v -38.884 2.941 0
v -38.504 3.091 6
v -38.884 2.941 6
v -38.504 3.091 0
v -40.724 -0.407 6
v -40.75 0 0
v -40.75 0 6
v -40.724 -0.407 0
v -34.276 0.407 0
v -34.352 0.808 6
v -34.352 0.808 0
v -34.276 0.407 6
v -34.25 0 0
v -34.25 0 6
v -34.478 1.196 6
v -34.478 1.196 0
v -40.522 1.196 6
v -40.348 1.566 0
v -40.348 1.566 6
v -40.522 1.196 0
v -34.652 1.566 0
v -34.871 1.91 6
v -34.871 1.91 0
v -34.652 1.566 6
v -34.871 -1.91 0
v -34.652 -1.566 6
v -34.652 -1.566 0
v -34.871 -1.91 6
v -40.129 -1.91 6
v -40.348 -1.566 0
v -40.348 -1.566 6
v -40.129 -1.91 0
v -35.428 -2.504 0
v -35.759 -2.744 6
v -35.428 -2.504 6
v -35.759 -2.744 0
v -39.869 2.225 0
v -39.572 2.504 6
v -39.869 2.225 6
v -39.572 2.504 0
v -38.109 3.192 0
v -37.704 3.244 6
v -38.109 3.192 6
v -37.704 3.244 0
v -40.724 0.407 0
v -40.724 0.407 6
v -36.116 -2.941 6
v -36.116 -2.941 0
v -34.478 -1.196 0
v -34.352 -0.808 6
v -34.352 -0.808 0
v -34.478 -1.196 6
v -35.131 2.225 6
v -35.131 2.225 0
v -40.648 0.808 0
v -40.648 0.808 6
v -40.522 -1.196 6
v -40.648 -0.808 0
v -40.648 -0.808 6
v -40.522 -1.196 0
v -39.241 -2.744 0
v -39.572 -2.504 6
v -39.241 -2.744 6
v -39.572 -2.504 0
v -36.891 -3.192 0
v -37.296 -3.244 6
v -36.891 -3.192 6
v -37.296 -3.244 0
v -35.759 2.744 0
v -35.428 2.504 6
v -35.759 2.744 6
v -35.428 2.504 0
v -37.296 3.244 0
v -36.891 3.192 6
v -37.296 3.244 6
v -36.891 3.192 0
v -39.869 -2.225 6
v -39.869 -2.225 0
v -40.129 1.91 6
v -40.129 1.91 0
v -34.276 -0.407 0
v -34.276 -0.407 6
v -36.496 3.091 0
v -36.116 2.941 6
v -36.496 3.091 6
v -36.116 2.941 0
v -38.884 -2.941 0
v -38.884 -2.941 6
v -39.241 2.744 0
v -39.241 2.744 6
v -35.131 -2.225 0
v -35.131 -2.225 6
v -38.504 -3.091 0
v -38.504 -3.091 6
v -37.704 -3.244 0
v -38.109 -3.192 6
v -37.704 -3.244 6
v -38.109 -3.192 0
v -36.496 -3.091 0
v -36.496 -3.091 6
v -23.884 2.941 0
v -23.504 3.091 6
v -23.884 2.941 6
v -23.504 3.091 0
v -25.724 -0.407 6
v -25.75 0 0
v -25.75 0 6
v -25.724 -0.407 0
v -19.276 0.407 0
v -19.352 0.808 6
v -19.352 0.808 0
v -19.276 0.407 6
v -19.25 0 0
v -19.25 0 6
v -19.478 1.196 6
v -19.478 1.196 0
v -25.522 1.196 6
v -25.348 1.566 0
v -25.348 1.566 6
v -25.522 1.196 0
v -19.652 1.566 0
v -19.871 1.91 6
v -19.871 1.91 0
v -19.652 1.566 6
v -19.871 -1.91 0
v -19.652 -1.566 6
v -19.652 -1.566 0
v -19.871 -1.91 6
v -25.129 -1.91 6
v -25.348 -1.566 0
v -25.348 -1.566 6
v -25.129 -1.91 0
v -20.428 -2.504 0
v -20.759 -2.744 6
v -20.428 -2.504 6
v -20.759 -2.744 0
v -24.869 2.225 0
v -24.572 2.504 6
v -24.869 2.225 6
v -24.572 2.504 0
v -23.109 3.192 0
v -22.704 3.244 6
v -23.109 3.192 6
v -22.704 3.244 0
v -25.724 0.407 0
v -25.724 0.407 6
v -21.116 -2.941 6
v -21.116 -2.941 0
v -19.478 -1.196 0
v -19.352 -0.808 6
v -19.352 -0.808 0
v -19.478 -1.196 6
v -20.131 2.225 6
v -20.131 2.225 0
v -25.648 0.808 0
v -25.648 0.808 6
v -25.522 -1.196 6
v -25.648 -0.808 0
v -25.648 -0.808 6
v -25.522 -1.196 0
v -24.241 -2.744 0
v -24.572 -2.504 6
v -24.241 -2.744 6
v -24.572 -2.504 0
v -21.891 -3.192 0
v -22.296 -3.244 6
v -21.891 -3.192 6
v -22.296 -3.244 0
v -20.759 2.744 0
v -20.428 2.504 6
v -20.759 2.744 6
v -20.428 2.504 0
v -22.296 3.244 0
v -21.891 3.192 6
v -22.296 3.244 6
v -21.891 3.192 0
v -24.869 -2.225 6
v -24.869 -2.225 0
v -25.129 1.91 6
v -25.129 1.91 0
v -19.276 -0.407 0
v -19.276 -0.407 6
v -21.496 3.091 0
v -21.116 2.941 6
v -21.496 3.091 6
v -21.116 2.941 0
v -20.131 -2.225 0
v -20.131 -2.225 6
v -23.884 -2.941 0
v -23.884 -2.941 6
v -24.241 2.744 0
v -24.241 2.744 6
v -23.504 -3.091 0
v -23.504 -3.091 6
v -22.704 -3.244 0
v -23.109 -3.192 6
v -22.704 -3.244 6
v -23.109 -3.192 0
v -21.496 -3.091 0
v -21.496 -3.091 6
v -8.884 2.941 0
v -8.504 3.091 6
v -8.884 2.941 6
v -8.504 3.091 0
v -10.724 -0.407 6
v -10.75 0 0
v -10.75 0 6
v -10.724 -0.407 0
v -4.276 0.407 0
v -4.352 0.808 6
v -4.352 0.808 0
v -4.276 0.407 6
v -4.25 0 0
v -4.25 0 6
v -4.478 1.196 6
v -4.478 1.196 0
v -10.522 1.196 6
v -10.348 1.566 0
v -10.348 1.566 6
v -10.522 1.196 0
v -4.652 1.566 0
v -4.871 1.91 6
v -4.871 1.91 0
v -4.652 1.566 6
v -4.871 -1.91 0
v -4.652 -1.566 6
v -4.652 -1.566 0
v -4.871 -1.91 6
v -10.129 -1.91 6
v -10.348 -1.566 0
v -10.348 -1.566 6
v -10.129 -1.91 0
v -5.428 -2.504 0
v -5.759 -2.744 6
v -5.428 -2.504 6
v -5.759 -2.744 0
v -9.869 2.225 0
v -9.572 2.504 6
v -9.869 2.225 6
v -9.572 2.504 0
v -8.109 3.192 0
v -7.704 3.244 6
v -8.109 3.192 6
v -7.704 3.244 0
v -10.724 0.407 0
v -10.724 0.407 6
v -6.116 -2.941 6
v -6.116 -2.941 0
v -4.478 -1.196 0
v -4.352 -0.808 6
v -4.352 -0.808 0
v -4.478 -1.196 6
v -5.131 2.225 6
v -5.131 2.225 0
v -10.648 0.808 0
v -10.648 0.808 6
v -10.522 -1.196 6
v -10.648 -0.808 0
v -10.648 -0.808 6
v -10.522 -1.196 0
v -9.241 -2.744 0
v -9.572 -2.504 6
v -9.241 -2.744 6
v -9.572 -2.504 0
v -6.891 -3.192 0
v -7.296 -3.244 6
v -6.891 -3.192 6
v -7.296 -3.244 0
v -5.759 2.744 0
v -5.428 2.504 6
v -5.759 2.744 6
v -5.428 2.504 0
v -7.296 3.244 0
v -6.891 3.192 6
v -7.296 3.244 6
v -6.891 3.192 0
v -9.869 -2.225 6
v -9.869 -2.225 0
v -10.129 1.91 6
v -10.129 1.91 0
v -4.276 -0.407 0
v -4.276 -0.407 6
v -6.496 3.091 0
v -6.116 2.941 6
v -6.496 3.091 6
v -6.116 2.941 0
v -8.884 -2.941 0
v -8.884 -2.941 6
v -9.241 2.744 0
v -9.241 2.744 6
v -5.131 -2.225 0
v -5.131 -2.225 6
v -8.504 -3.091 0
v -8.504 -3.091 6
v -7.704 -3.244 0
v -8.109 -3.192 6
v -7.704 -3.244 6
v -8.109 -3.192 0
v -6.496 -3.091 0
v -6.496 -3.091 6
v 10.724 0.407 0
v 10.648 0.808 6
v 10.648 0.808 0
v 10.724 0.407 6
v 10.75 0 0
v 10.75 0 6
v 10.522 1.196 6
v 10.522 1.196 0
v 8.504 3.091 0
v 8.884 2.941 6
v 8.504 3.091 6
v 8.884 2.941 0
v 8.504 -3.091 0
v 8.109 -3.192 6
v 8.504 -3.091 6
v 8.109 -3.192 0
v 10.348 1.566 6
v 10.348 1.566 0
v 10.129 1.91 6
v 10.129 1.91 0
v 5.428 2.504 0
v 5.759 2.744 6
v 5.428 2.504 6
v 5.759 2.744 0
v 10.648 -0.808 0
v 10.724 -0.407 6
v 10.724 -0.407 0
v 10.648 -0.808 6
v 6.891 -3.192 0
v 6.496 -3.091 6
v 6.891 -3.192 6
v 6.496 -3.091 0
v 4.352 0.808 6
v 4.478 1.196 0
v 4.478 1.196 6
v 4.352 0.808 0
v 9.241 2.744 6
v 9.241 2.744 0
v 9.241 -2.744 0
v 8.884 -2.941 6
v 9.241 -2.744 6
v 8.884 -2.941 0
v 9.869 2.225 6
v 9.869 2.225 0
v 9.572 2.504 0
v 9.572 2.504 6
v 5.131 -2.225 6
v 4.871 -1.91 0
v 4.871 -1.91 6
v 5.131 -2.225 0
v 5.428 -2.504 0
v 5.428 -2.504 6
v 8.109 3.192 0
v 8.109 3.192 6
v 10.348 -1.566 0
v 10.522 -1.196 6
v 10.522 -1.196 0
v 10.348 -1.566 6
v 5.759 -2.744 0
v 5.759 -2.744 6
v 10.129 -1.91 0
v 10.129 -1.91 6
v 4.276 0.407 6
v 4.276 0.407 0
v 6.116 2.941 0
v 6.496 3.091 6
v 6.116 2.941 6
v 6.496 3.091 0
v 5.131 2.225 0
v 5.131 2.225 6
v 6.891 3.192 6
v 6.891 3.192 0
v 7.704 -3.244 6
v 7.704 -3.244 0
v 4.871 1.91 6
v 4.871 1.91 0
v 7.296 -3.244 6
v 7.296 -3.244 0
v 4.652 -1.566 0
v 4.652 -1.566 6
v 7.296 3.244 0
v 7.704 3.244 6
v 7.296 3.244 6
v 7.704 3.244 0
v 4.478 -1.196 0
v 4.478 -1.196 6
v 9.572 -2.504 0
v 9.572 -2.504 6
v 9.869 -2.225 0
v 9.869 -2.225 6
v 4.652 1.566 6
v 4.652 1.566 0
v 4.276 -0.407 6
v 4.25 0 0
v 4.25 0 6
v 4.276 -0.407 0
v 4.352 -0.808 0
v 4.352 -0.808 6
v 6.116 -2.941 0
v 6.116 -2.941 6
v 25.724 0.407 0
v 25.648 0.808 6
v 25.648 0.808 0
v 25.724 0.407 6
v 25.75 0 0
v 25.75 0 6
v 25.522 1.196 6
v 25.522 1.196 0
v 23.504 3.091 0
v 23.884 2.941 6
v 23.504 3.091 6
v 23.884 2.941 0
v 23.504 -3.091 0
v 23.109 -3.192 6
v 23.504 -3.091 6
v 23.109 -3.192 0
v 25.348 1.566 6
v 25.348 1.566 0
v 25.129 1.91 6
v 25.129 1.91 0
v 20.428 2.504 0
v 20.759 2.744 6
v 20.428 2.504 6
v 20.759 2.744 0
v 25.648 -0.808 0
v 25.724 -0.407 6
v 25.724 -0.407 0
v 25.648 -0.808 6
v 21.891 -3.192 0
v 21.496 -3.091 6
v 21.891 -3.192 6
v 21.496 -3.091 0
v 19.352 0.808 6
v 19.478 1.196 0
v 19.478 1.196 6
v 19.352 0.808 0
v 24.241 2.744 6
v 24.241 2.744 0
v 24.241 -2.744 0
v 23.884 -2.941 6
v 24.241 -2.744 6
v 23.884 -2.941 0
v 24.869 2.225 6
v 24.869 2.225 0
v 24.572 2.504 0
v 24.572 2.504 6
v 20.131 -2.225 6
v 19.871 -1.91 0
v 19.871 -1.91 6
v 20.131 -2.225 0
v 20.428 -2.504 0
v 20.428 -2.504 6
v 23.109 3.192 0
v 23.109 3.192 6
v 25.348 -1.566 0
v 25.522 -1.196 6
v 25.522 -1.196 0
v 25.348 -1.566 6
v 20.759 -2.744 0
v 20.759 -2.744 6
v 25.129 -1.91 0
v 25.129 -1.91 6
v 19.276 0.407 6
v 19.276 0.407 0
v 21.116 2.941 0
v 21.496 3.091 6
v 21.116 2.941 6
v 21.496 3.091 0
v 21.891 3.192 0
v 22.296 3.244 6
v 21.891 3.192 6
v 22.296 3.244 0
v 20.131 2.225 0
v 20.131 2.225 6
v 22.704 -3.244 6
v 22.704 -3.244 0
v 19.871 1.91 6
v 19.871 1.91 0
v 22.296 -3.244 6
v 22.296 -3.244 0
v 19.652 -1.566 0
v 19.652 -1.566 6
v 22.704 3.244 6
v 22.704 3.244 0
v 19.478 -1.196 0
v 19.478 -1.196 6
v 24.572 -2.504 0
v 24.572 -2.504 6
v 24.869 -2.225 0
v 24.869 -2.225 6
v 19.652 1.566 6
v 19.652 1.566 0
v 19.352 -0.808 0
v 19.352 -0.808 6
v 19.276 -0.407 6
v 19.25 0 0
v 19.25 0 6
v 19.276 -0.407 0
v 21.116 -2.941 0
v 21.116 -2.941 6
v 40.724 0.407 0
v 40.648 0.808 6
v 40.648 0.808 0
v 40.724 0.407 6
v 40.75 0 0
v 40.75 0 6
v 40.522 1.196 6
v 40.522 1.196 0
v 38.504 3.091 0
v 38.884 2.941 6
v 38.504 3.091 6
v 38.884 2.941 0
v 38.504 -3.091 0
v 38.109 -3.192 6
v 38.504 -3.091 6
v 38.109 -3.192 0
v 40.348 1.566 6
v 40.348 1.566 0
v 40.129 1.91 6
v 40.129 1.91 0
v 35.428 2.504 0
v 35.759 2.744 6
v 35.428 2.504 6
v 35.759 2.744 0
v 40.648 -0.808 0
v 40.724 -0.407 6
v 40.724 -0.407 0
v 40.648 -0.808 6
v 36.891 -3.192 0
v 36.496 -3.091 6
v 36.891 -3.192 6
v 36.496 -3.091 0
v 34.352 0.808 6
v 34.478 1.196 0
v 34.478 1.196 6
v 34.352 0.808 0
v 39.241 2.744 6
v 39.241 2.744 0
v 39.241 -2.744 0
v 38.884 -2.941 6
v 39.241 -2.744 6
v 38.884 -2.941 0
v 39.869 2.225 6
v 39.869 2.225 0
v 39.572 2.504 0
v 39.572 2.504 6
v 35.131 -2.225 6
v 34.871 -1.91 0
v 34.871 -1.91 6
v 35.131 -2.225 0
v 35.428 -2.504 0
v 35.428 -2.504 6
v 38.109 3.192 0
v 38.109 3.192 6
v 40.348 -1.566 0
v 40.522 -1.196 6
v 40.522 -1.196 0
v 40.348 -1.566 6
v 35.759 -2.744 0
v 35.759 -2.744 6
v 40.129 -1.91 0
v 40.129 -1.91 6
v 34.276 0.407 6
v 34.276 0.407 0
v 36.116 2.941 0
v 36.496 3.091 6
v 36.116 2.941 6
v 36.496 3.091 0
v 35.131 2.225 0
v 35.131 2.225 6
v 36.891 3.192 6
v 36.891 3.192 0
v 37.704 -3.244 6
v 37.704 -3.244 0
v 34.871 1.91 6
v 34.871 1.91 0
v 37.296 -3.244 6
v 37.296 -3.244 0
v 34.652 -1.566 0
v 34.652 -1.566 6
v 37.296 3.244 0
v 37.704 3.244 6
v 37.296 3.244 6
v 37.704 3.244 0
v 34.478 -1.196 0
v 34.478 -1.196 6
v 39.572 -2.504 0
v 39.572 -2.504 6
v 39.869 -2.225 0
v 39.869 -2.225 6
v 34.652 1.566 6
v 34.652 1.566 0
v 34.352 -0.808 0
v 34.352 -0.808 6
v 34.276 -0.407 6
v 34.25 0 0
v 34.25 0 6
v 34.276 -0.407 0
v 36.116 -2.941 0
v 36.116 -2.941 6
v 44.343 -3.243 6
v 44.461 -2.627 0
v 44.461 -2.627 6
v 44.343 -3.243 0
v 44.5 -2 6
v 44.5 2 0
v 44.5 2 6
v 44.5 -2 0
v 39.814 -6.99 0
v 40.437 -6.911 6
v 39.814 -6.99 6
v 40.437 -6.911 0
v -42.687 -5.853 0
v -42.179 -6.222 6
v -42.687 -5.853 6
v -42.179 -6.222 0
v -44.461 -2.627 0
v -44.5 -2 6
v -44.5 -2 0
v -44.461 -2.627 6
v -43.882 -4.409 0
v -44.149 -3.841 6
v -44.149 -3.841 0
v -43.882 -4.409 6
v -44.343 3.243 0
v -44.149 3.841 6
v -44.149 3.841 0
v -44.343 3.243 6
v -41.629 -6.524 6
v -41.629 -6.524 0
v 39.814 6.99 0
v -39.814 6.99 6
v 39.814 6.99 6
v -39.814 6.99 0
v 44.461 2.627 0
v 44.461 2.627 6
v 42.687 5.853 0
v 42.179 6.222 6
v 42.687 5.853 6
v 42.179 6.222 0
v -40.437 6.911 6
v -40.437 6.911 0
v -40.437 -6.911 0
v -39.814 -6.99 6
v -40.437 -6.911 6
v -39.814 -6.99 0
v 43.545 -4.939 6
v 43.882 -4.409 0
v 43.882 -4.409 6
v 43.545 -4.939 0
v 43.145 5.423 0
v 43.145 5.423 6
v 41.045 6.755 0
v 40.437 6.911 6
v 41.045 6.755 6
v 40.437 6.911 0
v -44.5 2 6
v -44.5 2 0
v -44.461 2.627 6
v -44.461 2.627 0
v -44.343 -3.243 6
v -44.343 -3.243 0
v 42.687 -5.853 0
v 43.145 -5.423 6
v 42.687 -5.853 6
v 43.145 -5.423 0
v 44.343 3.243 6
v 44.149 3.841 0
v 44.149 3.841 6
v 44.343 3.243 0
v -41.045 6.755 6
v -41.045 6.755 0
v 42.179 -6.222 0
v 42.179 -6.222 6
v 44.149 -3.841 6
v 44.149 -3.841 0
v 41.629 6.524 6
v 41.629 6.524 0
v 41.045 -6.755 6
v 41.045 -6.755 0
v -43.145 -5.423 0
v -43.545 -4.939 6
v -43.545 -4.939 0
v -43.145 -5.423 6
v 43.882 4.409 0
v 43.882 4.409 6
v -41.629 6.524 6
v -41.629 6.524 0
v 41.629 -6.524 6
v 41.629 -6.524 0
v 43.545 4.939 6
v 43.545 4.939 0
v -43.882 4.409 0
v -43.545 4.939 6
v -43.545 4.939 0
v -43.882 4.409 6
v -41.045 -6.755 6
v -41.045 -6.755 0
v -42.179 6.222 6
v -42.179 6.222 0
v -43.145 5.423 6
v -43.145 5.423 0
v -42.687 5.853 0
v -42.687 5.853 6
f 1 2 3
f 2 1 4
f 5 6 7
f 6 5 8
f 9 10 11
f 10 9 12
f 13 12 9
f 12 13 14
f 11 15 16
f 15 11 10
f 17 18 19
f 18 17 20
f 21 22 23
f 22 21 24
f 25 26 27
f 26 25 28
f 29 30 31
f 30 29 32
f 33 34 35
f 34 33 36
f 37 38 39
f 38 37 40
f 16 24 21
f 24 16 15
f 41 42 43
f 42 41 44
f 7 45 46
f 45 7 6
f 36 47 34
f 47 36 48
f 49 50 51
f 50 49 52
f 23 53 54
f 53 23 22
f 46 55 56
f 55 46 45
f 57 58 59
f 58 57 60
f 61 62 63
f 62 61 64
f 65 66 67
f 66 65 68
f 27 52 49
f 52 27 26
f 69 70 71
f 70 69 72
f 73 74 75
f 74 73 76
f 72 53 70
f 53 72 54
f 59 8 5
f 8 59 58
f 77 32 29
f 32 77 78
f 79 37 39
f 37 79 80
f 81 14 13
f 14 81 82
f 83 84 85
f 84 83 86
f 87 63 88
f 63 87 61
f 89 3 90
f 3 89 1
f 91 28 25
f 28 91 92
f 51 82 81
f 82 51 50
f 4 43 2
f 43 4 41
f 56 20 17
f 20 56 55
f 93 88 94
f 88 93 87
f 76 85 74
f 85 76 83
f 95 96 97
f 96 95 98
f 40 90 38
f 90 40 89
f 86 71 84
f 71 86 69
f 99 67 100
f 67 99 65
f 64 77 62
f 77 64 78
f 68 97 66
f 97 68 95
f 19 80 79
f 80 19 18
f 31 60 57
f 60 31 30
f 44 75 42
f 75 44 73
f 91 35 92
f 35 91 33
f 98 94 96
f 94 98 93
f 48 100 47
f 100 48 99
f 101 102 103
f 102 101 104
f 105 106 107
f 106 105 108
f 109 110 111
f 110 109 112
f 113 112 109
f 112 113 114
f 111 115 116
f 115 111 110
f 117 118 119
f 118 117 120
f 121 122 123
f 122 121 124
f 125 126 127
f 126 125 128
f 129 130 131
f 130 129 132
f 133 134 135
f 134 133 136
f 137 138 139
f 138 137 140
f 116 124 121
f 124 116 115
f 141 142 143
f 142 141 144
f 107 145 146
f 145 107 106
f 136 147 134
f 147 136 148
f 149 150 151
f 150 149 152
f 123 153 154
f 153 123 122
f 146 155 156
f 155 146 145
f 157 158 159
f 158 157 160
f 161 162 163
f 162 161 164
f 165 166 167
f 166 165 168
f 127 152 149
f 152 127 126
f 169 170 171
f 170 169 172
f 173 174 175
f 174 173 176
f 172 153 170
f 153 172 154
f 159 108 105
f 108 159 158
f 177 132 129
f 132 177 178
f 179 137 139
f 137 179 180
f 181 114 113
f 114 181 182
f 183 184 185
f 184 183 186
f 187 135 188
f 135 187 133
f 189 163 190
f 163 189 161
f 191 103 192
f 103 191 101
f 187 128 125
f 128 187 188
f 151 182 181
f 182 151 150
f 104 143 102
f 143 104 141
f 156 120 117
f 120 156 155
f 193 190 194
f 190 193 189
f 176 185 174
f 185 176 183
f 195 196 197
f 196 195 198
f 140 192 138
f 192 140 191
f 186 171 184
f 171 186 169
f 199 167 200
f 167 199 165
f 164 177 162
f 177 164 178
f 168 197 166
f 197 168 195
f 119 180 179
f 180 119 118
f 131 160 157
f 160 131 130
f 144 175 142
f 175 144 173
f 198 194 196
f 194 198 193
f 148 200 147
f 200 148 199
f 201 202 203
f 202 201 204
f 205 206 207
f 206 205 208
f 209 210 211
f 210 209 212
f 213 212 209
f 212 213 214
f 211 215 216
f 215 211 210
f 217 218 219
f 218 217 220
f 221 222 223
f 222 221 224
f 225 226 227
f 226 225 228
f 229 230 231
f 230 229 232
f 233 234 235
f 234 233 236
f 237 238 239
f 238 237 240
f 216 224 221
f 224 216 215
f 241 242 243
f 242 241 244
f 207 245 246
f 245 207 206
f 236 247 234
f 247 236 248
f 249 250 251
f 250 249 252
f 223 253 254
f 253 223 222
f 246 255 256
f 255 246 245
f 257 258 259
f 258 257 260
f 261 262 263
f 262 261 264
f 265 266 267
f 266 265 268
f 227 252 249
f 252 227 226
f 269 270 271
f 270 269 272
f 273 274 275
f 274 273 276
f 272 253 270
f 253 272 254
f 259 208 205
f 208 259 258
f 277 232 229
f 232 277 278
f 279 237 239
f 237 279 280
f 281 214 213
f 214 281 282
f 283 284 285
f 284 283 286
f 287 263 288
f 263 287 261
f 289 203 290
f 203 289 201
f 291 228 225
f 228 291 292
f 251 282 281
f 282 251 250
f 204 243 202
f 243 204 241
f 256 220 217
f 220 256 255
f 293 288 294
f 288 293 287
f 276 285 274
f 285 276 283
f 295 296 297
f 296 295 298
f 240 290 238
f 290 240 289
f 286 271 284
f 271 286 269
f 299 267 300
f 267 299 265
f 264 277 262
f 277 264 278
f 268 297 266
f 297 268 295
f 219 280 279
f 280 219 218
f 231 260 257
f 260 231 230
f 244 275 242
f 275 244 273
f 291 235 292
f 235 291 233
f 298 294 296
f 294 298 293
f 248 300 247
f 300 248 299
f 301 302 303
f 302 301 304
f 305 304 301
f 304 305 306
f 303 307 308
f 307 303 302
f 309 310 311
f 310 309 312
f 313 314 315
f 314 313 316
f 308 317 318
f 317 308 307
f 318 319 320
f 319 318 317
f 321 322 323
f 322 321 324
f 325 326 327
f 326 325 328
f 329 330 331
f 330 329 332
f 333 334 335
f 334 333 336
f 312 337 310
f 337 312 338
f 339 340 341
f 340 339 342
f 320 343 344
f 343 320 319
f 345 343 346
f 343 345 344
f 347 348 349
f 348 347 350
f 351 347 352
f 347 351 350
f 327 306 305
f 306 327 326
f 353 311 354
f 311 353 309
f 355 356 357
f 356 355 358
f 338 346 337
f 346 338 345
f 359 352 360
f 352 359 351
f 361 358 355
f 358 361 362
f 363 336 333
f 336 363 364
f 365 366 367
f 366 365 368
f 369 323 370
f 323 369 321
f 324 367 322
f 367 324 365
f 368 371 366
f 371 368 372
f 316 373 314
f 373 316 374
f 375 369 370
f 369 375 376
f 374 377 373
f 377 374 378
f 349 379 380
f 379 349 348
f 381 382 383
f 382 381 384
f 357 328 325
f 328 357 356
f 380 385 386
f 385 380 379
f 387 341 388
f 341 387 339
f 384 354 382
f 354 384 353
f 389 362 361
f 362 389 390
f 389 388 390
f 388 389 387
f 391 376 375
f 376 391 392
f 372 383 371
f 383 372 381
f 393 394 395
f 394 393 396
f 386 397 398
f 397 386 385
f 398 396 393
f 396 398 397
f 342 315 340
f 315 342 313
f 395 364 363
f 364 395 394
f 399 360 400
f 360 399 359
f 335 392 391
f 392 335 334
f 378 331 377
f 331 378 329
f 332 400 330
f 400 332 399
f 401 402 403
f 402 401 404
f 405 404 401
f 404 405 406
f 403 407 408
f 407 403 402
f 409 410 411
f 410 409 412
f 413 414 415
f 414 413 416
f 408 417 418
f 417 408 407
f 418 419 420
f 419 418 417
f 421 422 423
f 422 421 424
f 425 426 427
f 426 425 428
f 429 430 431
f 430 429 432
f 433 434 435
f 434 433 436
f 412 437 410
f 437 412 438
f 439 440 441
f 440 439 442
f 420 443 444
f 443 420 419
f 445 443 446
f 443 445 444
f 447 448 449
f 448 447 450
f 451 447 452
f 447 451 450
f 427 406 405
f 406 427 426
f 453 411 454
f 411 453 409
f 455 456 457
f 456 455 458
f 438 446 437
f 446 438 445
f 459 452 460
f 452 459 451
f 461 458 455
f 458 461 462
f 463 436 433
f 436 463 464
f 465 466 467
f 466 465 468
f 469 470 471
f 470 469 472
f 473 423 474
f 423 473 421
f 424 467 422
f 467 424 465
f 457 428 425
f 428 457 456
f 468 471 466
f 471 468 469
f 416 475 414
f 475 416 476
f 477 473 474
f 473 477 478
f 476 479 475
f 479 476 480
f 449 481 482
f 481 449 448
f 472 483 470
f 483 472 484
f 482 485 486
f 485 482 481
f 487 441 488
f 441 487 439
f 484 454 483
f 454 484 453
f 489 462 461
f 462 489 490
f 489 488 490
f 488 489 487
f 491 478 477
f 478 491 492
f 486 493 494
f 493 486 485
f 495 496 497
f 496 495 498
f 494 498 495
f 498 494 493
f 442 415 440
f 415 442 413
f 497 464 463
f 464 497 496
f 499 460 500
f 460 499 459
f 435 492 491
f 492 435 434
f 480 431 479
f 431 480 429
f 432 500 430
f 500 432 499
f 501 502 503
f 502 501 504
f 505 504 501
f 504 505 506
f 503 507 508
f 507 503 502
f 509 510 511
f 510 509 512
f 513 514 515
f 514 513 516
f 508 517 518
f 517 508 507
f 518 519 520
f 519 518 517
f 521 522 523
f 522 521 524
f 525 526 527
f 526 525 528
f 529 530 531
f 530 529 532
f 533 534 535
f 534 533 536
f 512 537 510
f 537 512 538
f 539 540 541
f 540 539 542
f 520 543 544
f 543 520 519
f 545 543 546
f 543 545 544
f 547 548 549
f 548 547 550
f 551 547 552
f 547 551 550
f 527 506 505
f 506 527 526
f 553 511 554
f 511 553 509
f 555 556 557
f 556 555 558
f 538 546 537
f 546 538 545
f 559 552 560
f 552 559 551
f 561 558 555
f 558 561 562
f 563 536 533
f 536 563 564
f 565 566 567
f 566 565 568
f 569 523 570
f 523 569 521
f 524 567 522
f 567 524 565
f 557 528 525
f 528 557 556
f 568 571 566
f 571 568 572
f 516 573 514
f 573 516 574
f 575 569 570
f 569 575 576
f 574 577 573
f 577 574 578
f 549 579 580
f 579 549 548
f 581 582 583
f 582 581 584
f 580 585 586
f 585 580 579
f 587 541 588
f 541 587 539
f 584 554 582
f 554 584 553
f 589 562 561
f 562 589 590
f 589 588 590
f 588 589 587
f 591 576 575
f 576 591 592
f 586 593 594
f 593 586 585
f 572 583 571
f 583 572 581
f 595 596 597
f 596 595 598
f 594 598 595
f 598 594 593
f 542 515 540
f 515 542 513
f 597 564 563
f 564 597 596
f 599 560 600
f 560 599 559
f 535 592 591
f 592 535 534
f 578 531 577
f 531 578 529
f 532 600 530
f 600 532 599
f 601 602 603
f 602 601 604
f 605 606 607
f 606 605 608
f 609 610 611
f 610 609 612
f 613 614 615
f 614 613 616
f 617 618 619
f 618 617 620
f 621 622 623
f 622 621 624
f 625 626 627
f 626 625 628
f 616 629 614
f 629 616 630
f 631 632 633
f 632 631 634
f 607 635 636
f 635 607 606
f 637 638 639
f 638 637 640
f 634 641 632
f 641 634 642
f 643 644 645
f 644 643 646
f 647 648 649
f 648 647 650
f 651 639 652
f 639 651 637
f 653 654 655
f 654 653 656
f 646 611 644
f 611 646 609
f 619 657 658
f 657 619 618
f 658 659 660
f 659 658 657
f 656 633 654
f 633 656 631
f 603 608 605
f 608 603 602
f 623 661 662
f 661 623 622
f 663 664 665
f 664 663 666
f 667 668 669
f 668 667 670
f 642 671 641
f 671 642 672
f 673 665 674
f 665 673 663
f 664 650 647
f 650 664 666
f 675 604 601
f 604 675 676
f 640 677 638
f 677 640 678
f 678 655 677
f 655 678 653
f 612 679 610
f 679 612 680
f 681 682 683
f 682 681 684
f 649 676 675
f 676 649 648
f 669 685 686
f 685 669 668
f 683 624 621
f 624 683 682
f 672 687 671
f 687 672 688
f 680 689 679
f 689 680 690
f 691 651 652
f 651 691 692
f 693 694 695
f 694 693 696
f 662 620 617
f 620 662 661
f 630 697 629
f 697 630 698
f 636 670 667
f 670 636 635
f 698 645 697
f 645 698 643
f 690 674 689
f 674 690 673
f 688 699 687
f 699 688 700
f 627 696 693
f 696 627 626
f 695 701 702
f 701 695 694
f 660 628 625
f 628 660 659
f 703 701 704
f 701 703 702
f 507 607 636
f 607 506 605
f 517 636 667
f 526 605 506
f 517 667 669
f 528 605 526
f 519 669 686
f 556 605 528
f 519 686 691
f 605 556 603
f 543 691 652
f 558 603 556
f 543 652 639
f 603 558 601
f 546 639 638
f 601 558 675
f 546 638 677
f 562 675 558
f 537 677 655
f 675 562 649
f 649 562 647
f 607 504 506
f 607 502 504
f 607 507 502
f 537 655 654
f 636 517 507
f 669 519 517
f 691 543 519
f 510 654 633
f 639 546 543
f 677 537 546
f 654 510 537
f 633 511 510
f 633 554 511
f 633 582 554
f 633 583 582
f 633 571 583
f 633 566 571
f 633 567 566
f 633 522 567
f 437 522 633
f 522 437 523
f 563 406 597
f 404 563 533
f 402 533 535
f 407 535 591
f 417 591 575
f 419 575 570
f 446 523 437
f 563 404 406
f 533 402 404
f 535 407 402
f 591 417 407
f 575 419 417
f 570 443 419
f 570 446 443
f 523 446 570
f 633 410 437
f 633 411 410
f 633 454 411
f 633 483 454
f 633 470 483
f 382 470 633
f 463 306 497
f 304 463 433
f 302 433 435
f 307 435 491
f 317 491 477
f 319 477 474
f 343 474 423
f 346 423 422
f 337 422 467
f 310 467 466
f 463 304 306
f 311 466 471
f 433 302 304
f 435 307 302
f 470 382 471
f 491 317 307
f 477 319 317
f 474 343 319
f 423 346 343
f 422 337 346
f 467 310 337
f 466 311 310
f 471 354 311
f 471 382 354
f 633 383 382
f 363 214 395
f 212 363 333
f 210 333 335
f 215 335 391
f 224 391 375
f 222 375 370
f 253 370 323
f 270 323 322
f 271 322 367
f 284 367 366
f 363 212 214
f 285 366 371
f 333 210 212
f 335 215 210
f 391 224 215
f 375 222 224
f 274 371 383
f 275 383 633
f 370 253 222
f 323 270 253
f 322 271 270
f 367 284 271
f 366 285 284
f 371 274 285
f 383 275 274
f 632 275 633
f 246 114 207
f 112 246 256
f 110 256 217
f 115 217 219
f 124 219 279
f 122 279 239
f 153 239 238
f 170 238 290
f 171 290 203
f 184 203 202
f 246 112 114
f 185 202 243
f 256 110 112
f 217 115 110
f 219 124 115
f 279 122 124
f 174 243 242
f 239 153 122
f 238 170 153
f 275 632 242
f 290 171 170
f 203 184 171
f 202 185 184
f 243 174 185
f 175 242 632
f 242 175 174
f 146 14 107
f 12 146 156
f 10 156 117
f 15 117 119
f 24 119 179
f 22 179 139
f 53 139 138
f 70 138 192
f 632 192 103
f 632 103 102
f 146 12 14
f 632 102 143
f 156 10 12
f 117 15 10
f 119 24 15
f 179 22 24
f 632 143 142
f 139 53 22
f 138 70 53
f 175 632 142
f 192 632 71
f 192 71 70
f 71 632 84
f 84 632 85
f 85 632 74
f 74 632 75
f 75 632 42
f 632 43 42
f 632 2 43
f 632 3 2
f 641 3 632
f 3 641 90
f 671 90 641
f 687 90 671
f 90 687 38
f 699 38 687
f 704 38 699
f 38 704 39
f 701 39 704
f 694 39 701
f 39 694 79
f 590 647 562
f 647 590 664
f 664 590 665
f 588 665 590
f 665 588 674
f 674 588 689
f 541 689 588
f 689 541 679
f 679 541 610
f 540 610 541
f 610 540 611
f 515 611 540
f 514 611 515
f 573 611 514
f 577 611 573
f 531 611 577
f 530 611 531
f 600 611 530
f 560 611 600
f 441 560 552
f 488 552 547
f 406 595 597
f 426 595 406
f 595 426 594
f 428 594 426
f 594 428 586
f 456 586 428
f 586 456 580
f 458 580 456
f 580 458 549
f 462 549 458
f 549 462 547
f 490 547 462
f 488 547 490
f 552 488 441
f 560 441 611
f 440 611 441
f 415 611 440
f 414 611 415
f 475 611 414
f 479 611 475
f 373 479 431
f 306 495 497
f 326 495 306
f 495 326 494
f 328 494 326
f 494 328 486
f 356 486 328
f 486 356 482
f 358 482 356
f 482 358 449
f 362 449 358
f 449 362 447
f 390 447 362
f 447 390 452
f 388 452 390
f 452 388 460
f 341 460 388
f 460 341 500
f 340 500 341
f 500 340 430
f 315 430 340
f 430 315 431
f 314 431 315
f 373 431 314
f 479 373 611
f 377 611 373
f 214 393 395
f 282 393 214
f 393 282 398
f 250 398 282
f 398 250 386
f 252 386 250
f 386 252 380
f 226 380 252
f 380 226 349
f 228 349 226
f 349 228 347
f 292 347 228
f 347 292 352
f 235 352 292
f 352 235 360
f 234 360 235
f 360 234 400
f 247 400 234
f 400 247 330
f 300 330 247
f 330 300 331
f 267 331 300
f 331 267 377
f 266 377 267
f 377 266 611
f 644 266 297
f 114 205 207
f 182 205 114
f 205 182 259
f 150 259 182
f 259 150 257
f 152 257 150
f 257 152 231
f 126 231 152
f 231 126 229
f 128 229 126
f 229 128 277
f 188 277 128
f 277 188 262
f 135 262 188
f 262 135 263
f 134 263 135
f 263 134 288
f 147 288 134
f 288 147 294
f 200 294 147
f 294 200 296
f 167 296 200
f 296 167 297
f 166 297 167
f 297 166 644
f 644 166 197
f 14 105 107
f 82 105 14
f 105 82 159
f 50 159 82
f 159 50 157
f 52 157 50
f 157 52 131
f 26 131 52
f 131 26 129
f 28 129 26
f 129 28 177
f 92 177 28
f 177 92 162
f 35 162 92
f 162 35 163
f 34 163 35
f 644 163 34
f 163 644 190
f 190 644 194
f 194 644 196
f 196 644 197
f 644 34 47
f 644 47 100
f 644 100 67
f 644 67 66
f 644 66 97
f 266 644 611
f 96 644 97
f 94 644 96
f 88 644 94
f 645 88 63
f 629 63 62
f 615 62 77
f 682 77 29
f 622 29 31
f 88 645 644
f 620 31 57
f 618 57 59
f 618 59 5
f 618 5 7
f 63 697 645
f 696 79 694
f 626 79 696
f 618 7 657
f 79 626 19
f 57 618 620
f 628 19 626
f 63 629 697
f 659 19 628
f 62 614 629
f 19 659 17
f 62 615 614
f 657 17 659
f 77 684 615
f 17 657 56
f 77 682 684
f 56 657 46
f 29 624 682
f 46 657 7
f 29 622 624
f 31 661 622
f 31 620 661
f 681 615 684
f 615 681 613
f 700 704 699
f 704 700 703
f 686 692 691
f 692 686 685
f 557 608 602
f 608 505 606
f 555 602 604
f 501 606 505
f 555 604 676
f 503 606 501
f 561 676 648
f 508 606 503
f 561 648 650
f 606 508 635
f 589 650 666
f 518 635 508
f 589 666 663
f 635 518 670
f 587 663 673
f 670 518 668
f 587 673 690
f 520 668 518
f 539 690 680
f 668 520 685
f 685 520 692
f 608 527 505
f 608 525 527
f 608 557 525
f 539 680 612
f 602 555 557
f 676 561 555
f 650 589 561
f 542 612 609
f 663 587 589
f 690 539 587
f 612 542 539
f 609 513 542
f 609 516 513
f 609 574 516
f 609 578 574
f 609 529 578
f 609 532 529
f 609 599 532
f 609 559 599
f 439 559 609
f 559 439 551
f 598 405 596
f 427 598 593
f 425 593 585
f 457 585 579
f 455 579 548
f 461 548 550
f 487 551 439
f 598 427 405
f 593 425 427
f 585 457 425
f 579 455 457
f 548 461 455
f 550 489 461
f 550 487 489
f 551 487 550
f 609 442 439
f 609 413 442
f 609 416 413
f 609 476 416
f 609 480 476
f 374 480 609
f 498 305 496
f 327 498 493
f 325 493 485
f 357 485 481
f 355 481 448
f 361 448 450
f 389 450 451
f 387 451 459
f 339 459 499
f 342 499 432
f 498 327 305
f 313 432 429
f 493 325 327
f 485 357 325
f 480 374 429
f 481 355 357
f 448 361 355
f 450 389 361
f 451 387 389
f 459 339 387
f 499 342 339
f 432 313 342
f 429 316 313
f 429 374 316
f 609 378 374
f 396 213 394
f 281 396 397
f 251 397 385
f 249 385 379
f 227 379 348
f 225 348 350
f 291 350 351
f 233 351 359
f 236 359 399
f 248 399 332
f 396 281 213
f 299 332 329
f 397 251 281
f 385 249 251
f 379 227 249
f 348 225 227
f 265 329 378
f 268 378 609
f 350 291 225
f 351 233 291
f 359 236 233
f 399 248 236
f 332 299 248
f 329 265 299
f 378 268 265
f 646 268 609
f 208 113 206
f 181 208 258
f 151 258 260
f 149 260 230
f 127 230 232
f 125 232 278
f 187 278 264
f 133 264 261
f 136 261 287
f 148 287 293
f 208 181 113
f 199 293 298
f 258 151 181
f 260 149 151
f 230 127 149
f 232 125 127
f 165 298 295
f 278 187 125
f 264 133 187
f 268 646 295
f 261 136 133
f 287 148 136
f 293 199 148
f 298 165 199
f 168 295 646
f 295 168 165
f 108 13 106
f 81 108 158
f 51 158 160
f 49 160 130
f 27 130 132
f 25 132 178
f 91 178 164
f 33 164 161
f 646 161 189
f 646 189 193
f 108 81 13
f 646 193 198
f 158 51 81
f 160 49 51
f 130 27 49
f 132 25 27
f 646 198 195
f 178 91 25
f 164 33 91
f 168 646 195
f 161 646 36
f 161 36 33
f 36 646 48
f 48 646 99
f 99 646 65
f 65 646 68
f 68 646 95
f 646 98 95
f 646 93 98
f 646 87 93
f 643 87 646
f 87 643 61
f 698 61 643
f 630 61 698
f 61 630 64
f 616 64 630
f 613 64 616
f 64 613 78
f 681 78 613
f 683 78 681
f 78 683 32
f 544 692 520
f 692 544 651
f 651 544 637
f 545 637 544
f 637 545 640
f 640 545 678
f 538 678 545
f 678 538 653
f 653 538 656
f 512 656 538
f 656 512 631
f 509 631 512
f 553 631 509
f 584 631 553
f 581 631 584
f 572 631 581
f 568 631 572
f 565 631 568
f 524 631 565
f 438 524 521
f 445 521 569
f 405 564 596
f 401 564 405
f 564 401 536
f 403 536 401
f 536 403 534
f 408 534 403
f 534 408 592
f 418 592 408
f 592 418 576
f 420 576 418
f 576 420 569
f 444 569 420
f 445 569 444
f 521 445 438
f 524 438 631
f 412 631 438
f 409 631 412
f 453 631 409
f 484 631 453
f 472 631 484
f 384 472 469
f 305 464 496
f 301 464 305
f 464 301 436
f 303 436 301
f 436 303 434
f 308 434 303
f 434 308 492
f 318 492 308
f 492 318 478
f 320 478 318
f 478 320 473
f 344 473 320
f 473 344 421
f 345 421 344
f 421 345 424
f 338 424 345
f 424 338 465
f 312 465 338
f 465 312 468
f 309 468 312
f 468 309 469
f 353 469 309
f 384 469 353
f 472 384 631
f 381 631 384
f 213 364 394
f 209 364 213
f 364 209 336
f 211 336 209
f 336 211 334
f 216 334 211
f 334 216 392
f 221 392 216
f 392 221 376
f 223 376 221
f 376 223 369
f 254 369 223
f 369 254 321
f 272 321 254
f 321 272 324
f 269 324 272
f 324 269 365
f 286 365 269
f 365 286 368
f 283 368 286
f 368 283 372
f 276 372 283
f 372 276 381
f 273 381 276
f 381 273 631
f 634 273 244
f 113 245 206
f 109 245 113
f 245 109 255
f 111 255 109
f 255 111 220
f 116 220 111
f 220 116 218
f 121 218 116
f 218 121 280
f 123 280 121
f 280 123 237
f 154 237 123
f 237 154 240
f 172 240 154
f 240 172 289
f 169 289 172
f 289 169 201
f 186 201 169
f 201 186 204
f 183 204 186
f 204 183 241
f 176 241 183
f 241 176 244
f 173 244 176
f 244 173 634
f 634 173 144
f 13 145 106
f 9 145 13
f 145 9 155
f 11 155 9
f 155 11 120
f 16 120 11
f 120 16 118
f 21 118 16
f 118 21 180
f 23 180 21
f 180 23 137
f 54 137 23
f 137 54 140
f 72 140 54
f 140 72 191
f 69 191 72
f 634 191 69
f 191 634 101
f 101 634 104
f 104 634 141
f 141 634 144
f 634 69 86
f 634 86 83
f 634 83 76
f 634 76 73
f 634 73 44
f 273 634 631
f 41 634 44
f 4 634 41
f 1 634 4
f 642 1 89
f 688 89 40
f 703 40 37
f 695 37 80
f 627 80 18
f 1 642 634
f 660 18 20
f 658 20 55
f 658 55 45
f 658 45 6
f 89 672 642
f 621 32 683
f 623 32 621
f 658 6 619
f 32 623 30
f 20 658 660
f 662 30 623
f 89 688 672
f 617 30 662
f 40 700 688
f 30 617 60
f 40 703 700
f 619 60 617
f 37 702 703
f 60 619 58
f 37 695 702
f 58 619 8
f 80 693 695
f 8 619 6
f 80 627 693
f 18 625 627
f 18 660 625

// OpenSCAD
$fn = 50;


difference() {
	union() {
		hull() {
			translate(v = [-39.5000000000, 2.0000000000, 0]) {
				cylinder(h = 6, r = 5);
			}
			translate(v = [39.5000000000, 2.0000000000, 0]) {
				cylinder(h = 6, r = 5);
			}
			translate(v = [-39.5000000000, -2.0000000000, 0]) {
				cylinder(h = 6, r = 5);
			}
			translate(v = [39.5000000000, -2.0000000000, 0]) {
				cylinder(h = 6, r = 5);
			}
		}
	}
	union() {
		translate(v = [-37.5000000000, 0.0000000000, 0]) {
			translate(v = [0, 0, -100]) {
				cylinder(h = 200, r = 3.2500000000);
			}
		}
		translate(v = [-22.5000000000, 0.0000000000, 0]) {
			translate(v = [0, 0, -100]) {
				cylinder(h = 200, r = 3.2500000000);
			}
		}
		translate(v = [-7.5000000000, 0.0000000000, 0]) {
			translate(v = [0, 0, -100]) {
				cylinder(h = 200, r = 3.2500000000);
			}
		}
		translate(v = [7.5000000000, 0.0000000000, 0]) {
			translate(v = [0, 0, -100]) {
				cylinder(h = 200, r = 3.2500000000);
			}
		}
		translate(v = [22.5000000000, 0.0000000000, 0]) {
			translate(v = [0, 0, -100]) {
				cylinder(h = 200, r = 3.2500000000);
			}
		}
		translate(v = [37.5000000000, 0.0000000000, 0]) {
			translate(v = [0, 0, -100]) {
				cylinder(h = 200, r = 3.2500000000);
			}
		}
	}
}
